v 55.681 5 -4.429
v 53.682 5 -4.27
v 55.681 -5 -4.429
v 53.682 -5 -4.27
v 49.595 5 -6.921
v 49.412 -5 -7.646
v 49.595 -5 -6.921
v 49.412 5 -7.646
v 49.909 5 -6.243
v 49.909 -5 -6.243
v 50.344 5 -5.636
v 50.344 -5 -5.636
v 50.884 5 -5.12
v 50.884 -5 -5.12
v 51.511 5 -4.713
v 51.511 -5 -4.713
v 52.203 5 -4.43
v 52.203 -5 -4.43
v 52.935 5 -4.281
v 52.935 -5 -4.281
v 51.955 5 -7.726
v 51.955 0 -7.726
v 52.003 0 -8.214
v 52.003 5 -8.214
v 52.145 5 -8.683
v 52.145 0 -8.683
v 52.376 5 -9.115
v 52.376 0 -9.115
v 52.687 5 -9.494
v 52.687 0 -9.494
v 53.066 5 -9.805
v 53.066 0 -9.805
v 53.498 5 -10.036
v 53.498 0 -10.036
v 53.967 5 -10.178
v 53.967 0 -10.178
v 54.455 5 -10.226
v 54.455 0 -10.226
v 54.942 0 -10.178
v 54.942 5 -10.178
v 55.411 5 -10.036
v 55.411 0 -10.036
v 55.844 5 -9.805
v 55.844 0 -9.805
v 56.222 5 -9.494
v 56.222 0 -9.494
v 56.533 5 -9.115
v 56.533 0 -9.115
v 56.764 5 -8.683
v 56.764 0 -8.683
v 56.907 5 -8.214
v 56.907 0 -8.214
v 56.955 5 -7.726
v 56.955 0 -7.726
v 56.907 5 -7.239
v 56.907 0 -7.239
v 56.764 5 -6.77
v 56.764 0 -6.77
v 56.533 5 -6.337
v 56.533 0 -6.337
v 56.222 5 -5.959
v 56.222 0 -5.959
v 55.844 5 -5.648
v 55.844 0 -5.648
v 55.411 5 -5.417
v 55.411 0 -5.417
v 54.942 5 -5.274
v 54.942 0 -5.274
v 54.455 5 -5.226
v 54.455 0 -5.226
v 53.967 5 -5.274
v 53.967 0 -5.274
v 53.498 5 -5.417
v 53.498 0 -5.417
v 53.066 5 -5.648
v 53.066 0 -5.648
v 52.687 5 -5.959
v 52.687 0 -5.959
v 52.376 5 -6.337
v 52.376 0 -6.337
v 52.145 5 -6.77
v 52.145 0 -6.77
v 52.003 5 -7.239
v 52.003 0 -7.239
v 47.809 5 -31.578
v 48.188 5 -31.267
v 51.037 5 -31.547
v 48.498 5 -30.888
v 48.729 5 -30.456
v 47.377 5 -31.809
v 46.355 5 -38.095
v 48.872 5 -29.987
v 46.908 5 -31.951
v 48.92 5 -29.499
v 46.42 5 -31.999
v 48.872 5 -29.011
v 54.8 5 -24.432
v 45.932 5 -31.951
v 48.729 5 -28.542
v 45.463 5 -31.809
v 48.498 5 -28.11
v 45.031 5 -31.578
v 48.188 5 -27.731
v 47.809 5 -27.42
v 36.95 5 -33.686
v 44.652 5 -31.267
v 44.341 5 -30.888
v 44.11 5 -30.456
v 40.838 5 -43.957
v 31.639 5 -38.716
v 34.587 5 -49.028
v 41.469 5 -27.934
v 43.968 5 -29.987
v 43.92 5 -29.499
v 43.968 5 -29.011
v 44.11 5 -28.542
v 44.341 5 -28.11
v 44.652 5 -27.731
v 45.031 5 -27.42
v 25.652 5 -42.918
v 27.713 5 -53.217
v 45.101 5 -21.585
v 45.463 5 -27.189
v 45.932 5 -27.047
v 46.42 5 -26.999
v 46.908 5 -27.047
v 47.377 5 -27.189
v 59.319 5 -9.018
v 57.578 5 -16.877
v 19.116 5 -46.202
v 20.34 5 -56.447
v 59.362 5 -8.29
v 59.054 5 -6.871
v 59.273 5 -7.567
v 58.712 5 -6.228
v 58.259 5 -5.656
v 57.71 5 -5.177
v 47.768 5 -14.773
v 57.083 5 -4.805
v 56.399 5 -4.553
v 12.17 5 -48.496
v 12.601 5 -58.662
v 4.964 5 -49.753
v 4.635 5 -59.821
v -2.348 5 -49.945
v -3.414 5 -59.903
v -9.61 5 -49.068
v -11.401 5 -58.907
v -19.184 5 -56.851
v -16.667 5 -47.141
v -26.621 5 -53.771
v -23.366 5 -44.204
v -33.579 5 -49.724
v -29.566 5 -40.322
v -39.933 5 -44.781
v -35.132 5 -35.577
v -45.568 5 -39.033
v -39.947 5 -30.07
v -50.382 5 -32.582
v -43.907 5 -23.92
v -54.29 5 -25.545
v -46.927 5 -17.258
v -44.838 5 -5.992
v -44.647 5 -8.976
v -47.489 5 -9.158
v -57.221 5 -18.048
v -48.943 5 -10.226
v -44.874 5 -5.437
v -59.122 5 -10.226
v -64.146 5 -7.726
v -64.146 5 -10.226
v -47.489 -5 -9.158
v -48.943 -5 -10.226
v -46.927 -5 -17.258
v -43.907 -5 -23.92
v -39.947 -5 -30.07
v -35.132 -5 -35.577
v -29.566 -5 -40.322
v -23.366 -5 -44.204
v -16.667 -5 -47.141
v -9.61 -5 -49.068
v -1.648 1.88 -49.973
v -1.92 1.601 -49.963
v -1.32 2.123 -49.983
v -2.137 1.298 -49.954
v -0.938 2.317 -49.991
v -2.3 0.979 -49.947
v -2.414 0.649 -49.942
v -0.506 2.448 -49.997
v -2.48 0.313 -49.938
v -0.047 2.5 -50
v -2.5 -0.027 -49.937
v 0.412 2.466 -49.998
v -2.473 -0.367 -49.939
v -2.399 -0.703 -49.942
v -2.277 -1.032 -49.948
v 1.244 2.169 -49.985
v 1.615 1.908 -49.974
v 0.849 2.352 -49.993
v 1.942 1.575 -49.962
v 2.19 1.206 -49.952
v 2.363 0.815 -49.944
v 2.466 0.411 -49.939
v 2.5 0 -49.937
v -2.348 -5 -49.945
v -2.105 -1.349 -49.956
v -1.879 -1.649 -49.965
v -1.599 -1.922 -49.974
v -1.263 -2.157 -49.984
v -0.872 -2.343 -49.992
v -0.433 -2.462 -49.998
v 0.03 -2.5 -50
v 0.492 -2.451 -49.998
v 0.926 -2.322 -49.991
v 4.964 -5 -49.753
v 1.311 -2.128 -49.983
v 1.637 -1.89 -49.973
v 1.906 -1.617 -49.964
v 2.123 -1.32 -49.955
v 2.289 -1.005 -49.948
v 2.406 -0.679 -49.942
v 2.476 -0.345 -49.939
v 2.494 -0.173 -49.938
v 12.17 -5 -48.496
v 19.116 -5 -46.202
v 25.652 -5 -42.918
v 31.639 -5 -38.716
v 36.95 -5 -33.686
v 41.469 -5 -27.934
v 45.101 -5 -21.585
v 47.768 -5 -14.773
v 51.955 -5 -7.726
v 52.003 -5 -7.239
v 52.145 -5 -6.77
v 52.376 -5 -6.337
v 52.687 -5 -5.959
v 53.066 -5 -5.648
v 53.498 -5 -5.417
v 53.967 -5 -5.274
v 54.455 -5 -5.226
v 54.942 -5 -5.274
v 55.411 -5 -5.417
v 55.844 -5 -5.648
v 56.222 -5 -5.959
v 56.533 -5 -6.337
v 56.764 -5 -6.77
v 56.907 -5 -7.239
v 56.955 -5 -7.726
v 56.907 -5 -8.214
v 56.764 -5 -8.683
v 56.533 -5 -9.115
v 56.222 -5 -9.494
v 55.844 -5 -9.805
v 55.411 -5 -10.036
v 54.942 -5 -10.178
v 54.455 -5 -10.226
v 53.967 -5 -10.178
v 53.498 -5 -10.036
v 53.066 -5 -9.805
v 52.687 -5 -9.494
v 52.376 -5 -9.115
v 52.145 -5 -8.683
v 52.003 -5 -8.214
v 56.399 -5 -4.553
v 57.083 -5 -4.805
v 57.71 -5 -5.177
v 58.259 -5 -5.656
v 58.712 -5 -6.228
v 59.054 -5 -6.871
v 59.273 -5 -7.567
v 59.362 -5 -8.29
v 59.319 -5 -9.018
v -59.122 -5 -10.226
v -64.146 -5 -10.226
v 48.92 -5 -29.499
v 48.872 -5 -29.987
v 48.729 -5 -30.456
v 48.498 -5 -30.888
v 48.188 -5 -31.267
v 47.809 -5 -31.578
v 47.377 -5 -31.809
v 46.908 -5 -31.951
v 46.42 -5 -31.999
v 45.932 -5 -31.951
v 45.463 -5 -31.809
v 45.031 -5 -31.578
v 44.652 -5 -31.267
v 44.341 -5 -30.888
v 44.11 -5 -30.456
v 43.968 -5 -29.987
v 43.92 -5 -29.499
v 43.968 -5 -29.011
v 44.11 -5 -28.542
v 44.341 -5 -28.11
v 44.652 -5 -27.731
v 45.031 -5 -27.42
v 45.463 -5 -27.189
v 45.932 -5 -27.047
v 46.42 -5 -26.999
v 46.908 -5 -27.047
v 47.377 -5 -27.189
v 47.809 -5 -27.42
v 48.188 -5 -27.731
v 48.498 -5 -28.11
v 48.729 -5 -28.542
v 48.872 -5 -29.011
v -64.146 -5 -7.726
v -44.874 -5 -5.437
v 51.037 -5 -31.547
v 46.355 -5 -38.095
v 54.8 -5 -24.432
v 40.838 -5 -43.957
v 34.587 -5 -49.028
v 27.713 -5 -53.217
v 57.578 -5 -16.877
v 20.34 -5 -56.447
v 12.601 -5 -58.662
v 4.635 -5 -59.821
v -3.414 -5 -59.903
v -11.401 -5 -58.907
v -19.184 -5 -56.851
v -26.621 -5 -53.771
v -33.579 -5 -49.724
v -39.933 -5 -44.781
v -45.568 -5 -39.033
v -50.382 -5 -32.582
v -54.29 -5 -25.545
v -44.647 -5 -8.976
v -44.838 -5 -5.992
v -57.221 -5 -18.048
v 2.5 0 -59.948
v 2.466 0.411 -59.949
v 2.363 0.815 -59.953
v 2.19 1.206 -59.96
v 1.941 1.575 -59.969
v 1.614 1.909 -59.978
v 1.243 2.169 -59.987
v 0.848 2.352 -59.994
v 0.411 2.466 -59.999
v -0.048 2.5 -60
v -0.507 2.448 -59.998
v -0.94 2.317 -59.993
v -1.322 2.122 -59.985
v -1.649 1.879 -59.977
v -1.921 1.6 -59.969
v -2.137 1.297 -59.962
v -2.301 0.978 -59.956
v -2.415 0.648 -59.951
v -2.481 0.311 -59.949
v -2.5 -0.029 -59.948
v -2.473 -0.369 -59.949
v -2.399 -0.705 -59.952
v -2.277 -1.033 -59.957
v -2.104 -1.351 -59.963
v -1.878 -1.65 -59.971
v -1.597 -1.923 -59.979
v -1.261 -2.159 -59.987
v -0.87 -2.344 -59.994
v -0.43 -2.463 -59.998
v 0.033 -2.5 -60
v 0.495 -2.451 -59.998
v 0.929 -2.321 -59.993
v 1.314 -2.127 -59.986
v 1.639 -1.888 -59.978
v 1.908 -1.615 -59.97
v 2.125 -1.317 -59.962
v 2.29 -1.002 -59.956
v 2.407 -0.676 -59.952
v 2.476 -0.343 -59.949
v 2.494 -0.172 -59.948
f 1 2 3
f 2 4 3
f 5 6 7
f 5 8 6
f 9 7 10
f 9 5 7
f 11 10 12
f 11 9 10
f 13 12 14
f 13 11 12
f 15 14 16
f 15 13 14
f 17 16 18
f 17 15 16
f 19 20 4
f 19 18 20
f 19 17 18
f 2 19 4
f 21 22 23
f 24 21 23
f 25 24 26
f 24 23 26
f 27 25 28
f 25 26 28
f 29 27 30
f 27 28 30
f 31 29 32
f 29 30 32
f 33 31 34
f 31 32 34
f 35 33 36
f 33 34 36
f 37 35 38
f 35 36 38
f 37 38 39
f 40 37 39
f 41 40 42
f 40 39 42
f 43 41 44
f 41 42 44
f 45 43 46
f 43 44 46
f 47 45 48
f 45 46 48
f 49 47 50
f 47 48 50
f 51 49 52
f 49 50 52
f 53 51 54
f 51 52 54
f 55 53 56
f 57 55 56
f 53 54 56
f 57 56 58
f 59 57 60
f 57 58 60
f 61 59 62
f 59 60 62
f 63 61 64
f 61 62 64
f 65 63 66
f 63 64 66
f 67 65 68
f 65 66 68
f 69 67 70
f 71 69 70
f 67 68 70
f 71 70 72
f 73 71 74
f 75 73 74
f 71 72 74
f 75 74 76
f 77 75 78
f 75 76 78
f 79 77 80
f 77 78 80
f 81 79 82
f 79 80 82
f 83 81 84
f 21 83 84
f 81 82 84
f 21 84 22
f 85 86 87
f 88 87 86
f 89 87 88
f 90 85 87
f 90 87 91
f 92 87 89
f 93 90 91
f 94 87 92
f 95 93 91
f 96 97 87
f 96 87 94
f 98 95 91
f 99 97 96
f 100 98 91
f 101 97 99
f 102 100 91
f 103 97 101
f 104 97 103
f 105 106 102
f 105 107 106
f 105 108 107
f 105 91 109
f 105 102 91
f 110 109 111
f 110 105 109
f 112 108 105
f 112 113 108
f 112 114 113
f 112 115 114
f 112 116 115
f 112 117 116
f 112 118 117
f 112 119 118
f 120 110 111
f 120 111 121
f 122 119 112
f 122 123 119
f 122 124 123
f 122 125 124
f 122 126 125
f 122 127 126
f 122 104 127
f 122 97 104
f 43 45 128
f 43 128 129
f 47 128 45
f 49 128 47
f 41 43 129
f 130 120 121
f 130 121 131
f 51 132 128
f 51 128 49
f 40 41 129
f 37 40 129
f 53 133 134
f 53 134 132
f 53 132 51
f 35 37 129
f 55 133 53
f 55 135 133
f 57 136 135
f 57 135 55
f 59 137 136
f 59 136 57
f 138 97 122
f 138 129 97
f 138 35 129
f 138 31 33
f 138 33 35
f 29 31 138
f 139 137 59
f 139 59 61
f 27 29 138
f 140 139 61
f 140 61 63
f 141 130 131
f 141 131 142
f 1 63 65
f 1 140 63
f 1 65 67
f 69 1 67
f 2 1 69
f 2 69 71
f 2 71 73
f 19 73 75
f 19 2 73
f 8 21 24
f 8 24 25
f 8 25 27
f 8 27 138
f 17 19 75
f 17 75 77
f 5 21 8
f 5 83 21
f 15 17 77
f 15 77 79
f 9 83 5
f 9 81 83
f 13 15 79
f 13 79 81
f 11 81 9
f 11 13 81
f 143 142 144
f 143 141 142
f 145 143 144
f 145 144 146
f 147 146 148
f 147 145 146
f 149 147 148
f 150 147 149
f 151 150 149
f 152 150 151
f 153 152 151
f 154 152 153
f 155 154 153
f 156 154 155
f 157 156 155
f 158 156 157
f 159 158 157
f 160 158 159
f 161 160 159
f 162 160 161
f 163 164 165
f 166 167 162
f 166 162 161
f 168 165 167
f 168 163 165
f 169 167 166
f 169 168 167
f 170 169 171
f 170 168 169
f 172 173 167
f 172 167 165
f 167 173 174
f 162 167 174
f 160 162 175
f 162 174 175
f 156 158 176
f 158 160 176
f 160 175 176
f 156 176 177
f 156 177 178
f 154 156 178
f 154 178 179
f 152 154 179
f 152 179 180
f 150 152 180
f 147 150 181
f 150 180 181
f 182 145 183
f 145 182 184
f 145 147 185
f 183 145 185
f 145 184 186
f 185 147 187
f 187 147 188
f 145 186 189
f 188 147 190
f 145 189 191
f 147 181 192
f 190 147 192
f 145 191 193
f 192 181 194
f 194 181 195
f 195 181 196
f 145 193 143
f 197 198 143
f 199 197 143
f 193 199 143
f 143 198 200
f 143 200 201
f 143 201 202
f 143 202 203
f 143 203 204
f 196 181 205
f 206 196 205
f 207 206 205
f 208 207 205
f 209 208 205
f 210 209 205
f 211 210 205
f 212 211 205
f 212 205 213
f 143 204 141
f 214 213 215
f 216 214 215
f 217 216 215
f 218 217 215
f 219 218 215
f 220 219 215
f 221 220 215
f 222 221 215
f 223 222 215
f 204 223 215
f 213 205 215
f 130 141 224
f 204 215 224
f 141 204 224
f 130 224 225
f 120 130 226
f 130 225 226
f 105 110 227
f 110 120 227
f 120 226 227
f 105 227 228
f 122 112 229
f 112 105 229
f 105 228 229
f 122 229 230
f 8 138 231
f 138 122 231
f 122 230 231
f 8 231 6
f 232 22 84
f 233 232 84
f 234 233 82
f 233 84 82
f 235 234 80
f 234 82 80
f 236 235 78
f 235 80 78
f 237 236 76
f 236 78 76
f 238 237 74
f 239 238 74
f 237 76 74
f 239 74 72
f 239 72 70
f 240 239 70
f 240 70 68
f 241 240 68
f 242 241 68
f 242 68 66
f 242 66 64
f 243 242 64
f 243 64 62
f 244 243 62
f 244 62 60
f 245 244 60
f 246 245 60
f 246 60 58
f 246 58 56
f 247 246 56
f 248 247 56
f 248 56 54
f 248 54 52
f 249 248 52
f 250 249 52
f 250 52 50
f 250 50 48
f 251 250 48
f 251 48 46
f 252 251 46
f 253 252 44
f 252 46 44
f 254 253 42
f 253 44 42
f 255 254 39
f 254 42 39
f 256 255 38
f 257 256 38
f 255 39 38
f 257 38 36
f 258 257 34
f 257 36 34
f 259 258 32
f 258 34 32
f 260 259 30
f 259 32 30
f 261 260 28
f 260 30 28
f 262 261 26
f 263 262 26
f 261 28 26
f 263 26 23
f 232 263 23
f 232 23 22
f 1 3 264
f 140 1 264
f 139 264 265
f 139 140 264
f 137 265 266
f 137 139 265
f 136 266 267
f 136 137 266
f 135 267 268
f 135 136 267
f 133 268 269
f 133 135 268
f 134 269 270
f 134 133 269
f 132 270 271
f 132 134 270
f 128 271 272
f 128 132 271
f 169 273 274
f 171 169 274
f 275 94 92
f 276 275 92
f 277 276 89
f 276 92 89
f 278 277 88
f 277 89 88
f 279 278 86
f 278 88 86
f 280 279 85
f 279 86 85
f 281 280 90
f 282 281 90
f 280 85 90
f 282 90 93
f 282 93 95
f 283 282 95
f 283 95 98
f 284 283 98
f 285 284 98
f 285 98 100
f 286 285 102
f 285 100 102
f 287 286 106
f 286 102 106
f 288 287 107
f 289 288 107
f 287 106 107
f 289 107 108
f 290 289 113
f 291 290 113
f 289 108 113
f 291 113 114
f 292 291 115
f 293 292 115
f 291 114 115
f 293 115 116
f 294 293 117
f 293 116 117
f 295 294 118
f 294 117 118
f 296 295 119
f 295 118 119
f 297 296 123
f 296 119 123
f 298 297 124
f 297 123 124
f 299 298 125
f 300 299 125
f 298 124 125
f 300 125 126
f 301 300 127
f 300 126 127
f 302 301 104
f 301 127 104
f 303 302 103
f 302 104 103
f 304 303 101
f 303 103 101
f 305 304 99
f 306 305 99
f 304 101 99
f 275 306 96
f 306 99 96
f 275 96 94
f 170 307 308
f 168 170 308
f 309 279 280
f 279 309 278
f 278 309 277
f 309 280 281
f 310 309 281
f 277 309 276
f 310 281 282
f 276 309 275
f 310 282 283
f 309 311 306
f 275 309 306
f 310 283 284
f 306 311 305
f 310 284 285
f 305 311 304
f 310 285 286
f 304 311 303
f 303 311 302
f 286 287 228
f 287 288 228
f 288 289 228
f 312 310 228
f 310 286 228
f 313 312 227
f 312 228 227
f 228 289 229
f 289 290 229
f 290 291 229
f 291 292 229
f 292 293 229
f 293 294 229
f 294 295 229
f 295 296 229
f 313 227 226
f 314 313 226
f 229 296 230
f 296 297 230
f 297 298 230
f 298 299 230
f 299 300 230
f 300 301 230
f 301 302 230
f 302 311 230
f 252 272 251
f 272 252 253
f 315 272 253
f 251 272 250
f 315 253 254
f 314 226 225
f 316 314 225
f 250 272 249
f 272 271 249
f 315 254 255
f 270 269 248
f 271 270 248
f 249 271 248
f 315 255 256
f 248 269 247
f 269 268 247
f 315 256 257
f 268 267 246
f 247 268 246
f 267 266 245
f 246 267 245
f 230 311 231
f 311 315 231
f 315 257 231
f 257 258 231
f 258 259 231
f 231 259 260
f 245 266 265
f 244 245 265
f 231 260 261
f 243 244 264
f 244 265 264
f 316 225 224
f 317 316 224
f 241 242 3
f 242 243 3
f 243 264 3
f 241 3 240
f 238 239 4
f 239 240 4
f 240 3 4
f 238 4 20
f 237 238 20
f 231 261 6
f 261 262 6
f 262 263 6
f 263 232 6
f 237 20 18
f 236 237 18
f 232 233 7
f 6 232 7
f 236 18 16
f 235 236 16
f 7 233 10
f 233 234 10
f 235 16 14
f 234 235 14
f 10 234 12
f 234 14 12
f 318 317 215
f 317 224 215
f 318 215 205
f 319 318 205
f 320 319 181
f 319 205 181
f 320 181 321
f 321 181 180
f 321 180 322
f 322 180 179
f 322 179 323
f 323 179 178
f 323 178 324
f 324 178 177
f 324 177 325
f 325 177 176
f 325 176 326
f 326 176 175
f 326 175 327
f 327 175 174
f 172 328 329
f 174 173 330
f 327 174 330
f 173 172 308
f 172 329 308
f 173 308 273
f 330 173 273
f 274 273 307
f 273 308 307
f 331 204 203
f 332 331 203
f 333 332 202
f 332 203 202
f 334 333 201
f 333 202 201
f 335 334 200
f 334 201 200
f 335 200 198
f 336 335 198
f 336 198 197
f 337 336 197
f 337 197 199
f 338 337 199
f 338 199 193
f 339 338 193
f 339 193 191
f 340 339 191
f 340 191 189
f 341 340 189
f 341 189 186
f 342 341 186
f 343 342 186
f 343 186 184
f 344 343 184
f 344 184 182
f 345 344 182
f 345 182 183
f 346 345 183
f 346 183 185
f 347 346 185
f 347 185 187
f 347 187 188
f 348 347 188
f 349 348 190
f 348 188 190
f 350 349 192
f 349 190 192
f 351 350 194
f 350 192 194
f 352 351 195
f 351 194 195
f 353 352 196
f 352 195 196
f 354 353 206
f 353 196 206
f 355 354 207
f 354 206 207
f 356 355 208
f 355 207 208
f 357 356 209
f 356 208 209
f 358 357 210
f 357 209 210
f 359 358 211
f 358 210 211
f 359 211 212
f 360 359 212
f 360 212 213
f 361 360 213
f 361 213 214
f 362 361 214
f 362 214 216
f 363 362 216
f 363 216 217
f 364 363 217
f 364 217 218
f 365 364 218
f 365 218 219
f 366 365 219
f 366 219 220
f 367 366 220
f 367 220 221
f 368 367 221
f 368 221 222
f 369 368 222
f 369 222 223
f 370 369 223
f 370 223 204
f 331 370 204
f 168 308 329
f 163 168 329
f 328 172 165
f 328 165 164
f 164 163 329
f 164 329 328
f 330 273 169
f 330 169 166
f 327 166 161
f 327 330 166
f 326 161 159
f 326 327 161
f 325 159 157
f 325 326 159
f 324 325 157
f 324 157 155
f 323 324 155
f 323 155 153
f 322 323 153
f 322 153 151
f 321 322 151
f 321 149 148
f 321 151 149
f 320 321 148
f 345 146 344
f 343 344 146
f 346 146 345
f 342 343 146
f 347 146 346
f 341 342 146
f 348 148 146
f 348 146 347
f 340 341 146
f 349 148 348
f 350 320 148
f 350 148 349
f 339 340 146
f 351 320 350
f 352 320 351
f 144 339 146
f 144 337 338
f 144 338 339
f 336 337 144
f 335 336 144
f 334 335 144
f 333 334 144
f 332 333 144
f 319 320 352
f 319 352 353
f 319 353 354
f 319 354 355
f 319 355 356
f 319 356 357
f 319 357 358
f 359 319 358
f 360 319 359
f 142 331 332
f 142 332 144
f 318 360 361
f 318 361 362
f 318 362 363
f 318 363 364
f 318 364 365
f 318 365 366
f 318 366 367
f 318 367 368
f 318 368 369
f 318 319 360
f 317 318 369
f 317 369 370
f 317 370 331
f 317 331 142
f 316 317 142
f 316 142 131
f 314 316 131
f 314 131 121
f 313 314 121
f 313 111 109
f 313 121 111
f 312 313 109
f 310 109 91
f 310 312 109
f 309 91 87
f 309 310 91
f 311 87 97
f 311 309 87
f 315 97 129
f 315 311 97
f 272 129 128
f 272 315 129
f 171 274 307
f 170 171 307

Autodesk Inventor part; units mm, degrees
ref_plane "YZ Plane" through (0, 0, 0) normal (1, 0, 0) x (0, 1, 0)
ref_plane "XZ Plane" through (0, 0, 0) normal (0, 1, 0) x (-1, 0, 0)
ref_plane "XY Plane" through (0, 0, 0) normal (0, 0, 1) x (1, 0, 0)
sketch "Schizzo1" plane through (0, 0, 0) normal (0, 1, 0) x (-1, 0, 0)
  arc A0 (-49.8426, -3.9646) -> (48.9431, -10.2263) centre (0, 0) ccw
  arc A1 (-59.8111, -4.7575) -> (59.1221, -10.2263) centre (0, 0) ccw
  circle A2 centre (-54.4546, -7.7263) radius 2.5
  line L0 (-49.8426, -3.9646) -> (-59.8111, -4.7575)
  line L1 (59.1221, -10.2263) -> (64.1458, -10.2263)
  line L2 (64.1458, -10.2263) -> (64.1458, -7.7263)
  line L3 (64.1458, -10.2263) -> (44.6472, -8.9763)
  line L4 (48.9431, -10.2263) -> (47.4892, -9.1585)
  line L5 (44.8385, -5.9924) -> (44.6472, -8.9763)
  line L6 (64.1458, -7.7263) -> (44.8741, -5.4367)
  line L7 (44.8741, -5.4367) -> (44.8385, -5.9924)
  dimension "d0" = 100
  dimension "d6" = 5
  dimension "d8" = 2.5
  dimension "d9" = 2.5
extrude "Estrusione1" add sketch "Schizzo1" along normal mid plane 10 contours A0 L4 L3 L1 A1 L0 | L3 L5 L7 L6 L2 | A2
extrude "Estrusione2" cut sketch "Schizzo1" along normal through all both and the other way through all contours A2
fillet "Raccordo3" radius 4 1 edges at (59.8111, 0, -4.7575)
fillet "Raccordo4" radius 4 1 edges at (49.8426, 0, -3.9646)
sketch "Schizzo2" plane through (0, 5, 0) normal (0, 1, 0) x (1, 0, 0)
  circle A0 centre (46.4198, 29.499) radius 2.5
  circle A1 centre (54.4546, 7.7263) radius 2.5 projected
  arc A2 (49.412, 7.6457) -> (-48.9431, 10.2263) centre (0, 0) ccw projected
  line L0 (42.1413, 26.9094) -> (50.6984, 32.0886) construction
  arc A3 (59.3185, 9.0175) -> (-59.1221, 10.2263) centre (0, 0) ccw projected
  point P0 (-49.51, 6.9828)
  point P1 (-59.5579, 7.2704)
  point P2 (-60, 0)
  point P3 (-50, 0)
  dimension "d19" = 29.499
  dimension "d20" = 24.2008
extrude "Estrusione3" cut sketch "Schizzo2" against normal blind 10 contours A0
sketch "Schizzo4" plane through (0, 0, 0) normal (0, 0, 1) x (1, 0, 0)
  circle A0 centre (0, 0) radius 2.5
  dimension "d28" = 5
extrude "Estrusione5" cut sketch "Schizzo4" against normal through all
properties part number "ganascia"
